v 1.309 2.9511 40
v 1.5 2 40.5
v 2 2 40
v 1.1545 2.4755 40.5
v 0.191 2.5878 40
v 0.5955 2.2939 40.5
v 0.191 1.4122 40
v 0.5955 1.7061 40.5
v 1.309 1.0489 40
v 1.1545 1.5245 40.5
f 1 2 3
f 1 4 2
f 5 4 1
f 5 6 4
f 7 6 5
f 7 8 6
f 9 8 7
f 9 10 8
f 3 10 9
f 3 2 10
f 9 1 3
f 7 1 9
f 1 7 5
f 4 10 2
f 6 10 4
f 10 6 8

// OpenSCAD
module standoff(position, radius1, radius2, height, flip, z_offset){
	translate([position[0], position[1], z_offset])
	{
		if(flip)
		{
			rotate([180,0,0])
			{
				cylinder(height, r1 = radius1, r2 = radius2);
			}
		}
		else
		{
            cylinder(height, r1 = radius1, r2 = radius2);
		}
	}
}

standoff(position = [1,2],radius1 = 1,radius2 = .5,height = .5, flip=false,z_offset=40);
